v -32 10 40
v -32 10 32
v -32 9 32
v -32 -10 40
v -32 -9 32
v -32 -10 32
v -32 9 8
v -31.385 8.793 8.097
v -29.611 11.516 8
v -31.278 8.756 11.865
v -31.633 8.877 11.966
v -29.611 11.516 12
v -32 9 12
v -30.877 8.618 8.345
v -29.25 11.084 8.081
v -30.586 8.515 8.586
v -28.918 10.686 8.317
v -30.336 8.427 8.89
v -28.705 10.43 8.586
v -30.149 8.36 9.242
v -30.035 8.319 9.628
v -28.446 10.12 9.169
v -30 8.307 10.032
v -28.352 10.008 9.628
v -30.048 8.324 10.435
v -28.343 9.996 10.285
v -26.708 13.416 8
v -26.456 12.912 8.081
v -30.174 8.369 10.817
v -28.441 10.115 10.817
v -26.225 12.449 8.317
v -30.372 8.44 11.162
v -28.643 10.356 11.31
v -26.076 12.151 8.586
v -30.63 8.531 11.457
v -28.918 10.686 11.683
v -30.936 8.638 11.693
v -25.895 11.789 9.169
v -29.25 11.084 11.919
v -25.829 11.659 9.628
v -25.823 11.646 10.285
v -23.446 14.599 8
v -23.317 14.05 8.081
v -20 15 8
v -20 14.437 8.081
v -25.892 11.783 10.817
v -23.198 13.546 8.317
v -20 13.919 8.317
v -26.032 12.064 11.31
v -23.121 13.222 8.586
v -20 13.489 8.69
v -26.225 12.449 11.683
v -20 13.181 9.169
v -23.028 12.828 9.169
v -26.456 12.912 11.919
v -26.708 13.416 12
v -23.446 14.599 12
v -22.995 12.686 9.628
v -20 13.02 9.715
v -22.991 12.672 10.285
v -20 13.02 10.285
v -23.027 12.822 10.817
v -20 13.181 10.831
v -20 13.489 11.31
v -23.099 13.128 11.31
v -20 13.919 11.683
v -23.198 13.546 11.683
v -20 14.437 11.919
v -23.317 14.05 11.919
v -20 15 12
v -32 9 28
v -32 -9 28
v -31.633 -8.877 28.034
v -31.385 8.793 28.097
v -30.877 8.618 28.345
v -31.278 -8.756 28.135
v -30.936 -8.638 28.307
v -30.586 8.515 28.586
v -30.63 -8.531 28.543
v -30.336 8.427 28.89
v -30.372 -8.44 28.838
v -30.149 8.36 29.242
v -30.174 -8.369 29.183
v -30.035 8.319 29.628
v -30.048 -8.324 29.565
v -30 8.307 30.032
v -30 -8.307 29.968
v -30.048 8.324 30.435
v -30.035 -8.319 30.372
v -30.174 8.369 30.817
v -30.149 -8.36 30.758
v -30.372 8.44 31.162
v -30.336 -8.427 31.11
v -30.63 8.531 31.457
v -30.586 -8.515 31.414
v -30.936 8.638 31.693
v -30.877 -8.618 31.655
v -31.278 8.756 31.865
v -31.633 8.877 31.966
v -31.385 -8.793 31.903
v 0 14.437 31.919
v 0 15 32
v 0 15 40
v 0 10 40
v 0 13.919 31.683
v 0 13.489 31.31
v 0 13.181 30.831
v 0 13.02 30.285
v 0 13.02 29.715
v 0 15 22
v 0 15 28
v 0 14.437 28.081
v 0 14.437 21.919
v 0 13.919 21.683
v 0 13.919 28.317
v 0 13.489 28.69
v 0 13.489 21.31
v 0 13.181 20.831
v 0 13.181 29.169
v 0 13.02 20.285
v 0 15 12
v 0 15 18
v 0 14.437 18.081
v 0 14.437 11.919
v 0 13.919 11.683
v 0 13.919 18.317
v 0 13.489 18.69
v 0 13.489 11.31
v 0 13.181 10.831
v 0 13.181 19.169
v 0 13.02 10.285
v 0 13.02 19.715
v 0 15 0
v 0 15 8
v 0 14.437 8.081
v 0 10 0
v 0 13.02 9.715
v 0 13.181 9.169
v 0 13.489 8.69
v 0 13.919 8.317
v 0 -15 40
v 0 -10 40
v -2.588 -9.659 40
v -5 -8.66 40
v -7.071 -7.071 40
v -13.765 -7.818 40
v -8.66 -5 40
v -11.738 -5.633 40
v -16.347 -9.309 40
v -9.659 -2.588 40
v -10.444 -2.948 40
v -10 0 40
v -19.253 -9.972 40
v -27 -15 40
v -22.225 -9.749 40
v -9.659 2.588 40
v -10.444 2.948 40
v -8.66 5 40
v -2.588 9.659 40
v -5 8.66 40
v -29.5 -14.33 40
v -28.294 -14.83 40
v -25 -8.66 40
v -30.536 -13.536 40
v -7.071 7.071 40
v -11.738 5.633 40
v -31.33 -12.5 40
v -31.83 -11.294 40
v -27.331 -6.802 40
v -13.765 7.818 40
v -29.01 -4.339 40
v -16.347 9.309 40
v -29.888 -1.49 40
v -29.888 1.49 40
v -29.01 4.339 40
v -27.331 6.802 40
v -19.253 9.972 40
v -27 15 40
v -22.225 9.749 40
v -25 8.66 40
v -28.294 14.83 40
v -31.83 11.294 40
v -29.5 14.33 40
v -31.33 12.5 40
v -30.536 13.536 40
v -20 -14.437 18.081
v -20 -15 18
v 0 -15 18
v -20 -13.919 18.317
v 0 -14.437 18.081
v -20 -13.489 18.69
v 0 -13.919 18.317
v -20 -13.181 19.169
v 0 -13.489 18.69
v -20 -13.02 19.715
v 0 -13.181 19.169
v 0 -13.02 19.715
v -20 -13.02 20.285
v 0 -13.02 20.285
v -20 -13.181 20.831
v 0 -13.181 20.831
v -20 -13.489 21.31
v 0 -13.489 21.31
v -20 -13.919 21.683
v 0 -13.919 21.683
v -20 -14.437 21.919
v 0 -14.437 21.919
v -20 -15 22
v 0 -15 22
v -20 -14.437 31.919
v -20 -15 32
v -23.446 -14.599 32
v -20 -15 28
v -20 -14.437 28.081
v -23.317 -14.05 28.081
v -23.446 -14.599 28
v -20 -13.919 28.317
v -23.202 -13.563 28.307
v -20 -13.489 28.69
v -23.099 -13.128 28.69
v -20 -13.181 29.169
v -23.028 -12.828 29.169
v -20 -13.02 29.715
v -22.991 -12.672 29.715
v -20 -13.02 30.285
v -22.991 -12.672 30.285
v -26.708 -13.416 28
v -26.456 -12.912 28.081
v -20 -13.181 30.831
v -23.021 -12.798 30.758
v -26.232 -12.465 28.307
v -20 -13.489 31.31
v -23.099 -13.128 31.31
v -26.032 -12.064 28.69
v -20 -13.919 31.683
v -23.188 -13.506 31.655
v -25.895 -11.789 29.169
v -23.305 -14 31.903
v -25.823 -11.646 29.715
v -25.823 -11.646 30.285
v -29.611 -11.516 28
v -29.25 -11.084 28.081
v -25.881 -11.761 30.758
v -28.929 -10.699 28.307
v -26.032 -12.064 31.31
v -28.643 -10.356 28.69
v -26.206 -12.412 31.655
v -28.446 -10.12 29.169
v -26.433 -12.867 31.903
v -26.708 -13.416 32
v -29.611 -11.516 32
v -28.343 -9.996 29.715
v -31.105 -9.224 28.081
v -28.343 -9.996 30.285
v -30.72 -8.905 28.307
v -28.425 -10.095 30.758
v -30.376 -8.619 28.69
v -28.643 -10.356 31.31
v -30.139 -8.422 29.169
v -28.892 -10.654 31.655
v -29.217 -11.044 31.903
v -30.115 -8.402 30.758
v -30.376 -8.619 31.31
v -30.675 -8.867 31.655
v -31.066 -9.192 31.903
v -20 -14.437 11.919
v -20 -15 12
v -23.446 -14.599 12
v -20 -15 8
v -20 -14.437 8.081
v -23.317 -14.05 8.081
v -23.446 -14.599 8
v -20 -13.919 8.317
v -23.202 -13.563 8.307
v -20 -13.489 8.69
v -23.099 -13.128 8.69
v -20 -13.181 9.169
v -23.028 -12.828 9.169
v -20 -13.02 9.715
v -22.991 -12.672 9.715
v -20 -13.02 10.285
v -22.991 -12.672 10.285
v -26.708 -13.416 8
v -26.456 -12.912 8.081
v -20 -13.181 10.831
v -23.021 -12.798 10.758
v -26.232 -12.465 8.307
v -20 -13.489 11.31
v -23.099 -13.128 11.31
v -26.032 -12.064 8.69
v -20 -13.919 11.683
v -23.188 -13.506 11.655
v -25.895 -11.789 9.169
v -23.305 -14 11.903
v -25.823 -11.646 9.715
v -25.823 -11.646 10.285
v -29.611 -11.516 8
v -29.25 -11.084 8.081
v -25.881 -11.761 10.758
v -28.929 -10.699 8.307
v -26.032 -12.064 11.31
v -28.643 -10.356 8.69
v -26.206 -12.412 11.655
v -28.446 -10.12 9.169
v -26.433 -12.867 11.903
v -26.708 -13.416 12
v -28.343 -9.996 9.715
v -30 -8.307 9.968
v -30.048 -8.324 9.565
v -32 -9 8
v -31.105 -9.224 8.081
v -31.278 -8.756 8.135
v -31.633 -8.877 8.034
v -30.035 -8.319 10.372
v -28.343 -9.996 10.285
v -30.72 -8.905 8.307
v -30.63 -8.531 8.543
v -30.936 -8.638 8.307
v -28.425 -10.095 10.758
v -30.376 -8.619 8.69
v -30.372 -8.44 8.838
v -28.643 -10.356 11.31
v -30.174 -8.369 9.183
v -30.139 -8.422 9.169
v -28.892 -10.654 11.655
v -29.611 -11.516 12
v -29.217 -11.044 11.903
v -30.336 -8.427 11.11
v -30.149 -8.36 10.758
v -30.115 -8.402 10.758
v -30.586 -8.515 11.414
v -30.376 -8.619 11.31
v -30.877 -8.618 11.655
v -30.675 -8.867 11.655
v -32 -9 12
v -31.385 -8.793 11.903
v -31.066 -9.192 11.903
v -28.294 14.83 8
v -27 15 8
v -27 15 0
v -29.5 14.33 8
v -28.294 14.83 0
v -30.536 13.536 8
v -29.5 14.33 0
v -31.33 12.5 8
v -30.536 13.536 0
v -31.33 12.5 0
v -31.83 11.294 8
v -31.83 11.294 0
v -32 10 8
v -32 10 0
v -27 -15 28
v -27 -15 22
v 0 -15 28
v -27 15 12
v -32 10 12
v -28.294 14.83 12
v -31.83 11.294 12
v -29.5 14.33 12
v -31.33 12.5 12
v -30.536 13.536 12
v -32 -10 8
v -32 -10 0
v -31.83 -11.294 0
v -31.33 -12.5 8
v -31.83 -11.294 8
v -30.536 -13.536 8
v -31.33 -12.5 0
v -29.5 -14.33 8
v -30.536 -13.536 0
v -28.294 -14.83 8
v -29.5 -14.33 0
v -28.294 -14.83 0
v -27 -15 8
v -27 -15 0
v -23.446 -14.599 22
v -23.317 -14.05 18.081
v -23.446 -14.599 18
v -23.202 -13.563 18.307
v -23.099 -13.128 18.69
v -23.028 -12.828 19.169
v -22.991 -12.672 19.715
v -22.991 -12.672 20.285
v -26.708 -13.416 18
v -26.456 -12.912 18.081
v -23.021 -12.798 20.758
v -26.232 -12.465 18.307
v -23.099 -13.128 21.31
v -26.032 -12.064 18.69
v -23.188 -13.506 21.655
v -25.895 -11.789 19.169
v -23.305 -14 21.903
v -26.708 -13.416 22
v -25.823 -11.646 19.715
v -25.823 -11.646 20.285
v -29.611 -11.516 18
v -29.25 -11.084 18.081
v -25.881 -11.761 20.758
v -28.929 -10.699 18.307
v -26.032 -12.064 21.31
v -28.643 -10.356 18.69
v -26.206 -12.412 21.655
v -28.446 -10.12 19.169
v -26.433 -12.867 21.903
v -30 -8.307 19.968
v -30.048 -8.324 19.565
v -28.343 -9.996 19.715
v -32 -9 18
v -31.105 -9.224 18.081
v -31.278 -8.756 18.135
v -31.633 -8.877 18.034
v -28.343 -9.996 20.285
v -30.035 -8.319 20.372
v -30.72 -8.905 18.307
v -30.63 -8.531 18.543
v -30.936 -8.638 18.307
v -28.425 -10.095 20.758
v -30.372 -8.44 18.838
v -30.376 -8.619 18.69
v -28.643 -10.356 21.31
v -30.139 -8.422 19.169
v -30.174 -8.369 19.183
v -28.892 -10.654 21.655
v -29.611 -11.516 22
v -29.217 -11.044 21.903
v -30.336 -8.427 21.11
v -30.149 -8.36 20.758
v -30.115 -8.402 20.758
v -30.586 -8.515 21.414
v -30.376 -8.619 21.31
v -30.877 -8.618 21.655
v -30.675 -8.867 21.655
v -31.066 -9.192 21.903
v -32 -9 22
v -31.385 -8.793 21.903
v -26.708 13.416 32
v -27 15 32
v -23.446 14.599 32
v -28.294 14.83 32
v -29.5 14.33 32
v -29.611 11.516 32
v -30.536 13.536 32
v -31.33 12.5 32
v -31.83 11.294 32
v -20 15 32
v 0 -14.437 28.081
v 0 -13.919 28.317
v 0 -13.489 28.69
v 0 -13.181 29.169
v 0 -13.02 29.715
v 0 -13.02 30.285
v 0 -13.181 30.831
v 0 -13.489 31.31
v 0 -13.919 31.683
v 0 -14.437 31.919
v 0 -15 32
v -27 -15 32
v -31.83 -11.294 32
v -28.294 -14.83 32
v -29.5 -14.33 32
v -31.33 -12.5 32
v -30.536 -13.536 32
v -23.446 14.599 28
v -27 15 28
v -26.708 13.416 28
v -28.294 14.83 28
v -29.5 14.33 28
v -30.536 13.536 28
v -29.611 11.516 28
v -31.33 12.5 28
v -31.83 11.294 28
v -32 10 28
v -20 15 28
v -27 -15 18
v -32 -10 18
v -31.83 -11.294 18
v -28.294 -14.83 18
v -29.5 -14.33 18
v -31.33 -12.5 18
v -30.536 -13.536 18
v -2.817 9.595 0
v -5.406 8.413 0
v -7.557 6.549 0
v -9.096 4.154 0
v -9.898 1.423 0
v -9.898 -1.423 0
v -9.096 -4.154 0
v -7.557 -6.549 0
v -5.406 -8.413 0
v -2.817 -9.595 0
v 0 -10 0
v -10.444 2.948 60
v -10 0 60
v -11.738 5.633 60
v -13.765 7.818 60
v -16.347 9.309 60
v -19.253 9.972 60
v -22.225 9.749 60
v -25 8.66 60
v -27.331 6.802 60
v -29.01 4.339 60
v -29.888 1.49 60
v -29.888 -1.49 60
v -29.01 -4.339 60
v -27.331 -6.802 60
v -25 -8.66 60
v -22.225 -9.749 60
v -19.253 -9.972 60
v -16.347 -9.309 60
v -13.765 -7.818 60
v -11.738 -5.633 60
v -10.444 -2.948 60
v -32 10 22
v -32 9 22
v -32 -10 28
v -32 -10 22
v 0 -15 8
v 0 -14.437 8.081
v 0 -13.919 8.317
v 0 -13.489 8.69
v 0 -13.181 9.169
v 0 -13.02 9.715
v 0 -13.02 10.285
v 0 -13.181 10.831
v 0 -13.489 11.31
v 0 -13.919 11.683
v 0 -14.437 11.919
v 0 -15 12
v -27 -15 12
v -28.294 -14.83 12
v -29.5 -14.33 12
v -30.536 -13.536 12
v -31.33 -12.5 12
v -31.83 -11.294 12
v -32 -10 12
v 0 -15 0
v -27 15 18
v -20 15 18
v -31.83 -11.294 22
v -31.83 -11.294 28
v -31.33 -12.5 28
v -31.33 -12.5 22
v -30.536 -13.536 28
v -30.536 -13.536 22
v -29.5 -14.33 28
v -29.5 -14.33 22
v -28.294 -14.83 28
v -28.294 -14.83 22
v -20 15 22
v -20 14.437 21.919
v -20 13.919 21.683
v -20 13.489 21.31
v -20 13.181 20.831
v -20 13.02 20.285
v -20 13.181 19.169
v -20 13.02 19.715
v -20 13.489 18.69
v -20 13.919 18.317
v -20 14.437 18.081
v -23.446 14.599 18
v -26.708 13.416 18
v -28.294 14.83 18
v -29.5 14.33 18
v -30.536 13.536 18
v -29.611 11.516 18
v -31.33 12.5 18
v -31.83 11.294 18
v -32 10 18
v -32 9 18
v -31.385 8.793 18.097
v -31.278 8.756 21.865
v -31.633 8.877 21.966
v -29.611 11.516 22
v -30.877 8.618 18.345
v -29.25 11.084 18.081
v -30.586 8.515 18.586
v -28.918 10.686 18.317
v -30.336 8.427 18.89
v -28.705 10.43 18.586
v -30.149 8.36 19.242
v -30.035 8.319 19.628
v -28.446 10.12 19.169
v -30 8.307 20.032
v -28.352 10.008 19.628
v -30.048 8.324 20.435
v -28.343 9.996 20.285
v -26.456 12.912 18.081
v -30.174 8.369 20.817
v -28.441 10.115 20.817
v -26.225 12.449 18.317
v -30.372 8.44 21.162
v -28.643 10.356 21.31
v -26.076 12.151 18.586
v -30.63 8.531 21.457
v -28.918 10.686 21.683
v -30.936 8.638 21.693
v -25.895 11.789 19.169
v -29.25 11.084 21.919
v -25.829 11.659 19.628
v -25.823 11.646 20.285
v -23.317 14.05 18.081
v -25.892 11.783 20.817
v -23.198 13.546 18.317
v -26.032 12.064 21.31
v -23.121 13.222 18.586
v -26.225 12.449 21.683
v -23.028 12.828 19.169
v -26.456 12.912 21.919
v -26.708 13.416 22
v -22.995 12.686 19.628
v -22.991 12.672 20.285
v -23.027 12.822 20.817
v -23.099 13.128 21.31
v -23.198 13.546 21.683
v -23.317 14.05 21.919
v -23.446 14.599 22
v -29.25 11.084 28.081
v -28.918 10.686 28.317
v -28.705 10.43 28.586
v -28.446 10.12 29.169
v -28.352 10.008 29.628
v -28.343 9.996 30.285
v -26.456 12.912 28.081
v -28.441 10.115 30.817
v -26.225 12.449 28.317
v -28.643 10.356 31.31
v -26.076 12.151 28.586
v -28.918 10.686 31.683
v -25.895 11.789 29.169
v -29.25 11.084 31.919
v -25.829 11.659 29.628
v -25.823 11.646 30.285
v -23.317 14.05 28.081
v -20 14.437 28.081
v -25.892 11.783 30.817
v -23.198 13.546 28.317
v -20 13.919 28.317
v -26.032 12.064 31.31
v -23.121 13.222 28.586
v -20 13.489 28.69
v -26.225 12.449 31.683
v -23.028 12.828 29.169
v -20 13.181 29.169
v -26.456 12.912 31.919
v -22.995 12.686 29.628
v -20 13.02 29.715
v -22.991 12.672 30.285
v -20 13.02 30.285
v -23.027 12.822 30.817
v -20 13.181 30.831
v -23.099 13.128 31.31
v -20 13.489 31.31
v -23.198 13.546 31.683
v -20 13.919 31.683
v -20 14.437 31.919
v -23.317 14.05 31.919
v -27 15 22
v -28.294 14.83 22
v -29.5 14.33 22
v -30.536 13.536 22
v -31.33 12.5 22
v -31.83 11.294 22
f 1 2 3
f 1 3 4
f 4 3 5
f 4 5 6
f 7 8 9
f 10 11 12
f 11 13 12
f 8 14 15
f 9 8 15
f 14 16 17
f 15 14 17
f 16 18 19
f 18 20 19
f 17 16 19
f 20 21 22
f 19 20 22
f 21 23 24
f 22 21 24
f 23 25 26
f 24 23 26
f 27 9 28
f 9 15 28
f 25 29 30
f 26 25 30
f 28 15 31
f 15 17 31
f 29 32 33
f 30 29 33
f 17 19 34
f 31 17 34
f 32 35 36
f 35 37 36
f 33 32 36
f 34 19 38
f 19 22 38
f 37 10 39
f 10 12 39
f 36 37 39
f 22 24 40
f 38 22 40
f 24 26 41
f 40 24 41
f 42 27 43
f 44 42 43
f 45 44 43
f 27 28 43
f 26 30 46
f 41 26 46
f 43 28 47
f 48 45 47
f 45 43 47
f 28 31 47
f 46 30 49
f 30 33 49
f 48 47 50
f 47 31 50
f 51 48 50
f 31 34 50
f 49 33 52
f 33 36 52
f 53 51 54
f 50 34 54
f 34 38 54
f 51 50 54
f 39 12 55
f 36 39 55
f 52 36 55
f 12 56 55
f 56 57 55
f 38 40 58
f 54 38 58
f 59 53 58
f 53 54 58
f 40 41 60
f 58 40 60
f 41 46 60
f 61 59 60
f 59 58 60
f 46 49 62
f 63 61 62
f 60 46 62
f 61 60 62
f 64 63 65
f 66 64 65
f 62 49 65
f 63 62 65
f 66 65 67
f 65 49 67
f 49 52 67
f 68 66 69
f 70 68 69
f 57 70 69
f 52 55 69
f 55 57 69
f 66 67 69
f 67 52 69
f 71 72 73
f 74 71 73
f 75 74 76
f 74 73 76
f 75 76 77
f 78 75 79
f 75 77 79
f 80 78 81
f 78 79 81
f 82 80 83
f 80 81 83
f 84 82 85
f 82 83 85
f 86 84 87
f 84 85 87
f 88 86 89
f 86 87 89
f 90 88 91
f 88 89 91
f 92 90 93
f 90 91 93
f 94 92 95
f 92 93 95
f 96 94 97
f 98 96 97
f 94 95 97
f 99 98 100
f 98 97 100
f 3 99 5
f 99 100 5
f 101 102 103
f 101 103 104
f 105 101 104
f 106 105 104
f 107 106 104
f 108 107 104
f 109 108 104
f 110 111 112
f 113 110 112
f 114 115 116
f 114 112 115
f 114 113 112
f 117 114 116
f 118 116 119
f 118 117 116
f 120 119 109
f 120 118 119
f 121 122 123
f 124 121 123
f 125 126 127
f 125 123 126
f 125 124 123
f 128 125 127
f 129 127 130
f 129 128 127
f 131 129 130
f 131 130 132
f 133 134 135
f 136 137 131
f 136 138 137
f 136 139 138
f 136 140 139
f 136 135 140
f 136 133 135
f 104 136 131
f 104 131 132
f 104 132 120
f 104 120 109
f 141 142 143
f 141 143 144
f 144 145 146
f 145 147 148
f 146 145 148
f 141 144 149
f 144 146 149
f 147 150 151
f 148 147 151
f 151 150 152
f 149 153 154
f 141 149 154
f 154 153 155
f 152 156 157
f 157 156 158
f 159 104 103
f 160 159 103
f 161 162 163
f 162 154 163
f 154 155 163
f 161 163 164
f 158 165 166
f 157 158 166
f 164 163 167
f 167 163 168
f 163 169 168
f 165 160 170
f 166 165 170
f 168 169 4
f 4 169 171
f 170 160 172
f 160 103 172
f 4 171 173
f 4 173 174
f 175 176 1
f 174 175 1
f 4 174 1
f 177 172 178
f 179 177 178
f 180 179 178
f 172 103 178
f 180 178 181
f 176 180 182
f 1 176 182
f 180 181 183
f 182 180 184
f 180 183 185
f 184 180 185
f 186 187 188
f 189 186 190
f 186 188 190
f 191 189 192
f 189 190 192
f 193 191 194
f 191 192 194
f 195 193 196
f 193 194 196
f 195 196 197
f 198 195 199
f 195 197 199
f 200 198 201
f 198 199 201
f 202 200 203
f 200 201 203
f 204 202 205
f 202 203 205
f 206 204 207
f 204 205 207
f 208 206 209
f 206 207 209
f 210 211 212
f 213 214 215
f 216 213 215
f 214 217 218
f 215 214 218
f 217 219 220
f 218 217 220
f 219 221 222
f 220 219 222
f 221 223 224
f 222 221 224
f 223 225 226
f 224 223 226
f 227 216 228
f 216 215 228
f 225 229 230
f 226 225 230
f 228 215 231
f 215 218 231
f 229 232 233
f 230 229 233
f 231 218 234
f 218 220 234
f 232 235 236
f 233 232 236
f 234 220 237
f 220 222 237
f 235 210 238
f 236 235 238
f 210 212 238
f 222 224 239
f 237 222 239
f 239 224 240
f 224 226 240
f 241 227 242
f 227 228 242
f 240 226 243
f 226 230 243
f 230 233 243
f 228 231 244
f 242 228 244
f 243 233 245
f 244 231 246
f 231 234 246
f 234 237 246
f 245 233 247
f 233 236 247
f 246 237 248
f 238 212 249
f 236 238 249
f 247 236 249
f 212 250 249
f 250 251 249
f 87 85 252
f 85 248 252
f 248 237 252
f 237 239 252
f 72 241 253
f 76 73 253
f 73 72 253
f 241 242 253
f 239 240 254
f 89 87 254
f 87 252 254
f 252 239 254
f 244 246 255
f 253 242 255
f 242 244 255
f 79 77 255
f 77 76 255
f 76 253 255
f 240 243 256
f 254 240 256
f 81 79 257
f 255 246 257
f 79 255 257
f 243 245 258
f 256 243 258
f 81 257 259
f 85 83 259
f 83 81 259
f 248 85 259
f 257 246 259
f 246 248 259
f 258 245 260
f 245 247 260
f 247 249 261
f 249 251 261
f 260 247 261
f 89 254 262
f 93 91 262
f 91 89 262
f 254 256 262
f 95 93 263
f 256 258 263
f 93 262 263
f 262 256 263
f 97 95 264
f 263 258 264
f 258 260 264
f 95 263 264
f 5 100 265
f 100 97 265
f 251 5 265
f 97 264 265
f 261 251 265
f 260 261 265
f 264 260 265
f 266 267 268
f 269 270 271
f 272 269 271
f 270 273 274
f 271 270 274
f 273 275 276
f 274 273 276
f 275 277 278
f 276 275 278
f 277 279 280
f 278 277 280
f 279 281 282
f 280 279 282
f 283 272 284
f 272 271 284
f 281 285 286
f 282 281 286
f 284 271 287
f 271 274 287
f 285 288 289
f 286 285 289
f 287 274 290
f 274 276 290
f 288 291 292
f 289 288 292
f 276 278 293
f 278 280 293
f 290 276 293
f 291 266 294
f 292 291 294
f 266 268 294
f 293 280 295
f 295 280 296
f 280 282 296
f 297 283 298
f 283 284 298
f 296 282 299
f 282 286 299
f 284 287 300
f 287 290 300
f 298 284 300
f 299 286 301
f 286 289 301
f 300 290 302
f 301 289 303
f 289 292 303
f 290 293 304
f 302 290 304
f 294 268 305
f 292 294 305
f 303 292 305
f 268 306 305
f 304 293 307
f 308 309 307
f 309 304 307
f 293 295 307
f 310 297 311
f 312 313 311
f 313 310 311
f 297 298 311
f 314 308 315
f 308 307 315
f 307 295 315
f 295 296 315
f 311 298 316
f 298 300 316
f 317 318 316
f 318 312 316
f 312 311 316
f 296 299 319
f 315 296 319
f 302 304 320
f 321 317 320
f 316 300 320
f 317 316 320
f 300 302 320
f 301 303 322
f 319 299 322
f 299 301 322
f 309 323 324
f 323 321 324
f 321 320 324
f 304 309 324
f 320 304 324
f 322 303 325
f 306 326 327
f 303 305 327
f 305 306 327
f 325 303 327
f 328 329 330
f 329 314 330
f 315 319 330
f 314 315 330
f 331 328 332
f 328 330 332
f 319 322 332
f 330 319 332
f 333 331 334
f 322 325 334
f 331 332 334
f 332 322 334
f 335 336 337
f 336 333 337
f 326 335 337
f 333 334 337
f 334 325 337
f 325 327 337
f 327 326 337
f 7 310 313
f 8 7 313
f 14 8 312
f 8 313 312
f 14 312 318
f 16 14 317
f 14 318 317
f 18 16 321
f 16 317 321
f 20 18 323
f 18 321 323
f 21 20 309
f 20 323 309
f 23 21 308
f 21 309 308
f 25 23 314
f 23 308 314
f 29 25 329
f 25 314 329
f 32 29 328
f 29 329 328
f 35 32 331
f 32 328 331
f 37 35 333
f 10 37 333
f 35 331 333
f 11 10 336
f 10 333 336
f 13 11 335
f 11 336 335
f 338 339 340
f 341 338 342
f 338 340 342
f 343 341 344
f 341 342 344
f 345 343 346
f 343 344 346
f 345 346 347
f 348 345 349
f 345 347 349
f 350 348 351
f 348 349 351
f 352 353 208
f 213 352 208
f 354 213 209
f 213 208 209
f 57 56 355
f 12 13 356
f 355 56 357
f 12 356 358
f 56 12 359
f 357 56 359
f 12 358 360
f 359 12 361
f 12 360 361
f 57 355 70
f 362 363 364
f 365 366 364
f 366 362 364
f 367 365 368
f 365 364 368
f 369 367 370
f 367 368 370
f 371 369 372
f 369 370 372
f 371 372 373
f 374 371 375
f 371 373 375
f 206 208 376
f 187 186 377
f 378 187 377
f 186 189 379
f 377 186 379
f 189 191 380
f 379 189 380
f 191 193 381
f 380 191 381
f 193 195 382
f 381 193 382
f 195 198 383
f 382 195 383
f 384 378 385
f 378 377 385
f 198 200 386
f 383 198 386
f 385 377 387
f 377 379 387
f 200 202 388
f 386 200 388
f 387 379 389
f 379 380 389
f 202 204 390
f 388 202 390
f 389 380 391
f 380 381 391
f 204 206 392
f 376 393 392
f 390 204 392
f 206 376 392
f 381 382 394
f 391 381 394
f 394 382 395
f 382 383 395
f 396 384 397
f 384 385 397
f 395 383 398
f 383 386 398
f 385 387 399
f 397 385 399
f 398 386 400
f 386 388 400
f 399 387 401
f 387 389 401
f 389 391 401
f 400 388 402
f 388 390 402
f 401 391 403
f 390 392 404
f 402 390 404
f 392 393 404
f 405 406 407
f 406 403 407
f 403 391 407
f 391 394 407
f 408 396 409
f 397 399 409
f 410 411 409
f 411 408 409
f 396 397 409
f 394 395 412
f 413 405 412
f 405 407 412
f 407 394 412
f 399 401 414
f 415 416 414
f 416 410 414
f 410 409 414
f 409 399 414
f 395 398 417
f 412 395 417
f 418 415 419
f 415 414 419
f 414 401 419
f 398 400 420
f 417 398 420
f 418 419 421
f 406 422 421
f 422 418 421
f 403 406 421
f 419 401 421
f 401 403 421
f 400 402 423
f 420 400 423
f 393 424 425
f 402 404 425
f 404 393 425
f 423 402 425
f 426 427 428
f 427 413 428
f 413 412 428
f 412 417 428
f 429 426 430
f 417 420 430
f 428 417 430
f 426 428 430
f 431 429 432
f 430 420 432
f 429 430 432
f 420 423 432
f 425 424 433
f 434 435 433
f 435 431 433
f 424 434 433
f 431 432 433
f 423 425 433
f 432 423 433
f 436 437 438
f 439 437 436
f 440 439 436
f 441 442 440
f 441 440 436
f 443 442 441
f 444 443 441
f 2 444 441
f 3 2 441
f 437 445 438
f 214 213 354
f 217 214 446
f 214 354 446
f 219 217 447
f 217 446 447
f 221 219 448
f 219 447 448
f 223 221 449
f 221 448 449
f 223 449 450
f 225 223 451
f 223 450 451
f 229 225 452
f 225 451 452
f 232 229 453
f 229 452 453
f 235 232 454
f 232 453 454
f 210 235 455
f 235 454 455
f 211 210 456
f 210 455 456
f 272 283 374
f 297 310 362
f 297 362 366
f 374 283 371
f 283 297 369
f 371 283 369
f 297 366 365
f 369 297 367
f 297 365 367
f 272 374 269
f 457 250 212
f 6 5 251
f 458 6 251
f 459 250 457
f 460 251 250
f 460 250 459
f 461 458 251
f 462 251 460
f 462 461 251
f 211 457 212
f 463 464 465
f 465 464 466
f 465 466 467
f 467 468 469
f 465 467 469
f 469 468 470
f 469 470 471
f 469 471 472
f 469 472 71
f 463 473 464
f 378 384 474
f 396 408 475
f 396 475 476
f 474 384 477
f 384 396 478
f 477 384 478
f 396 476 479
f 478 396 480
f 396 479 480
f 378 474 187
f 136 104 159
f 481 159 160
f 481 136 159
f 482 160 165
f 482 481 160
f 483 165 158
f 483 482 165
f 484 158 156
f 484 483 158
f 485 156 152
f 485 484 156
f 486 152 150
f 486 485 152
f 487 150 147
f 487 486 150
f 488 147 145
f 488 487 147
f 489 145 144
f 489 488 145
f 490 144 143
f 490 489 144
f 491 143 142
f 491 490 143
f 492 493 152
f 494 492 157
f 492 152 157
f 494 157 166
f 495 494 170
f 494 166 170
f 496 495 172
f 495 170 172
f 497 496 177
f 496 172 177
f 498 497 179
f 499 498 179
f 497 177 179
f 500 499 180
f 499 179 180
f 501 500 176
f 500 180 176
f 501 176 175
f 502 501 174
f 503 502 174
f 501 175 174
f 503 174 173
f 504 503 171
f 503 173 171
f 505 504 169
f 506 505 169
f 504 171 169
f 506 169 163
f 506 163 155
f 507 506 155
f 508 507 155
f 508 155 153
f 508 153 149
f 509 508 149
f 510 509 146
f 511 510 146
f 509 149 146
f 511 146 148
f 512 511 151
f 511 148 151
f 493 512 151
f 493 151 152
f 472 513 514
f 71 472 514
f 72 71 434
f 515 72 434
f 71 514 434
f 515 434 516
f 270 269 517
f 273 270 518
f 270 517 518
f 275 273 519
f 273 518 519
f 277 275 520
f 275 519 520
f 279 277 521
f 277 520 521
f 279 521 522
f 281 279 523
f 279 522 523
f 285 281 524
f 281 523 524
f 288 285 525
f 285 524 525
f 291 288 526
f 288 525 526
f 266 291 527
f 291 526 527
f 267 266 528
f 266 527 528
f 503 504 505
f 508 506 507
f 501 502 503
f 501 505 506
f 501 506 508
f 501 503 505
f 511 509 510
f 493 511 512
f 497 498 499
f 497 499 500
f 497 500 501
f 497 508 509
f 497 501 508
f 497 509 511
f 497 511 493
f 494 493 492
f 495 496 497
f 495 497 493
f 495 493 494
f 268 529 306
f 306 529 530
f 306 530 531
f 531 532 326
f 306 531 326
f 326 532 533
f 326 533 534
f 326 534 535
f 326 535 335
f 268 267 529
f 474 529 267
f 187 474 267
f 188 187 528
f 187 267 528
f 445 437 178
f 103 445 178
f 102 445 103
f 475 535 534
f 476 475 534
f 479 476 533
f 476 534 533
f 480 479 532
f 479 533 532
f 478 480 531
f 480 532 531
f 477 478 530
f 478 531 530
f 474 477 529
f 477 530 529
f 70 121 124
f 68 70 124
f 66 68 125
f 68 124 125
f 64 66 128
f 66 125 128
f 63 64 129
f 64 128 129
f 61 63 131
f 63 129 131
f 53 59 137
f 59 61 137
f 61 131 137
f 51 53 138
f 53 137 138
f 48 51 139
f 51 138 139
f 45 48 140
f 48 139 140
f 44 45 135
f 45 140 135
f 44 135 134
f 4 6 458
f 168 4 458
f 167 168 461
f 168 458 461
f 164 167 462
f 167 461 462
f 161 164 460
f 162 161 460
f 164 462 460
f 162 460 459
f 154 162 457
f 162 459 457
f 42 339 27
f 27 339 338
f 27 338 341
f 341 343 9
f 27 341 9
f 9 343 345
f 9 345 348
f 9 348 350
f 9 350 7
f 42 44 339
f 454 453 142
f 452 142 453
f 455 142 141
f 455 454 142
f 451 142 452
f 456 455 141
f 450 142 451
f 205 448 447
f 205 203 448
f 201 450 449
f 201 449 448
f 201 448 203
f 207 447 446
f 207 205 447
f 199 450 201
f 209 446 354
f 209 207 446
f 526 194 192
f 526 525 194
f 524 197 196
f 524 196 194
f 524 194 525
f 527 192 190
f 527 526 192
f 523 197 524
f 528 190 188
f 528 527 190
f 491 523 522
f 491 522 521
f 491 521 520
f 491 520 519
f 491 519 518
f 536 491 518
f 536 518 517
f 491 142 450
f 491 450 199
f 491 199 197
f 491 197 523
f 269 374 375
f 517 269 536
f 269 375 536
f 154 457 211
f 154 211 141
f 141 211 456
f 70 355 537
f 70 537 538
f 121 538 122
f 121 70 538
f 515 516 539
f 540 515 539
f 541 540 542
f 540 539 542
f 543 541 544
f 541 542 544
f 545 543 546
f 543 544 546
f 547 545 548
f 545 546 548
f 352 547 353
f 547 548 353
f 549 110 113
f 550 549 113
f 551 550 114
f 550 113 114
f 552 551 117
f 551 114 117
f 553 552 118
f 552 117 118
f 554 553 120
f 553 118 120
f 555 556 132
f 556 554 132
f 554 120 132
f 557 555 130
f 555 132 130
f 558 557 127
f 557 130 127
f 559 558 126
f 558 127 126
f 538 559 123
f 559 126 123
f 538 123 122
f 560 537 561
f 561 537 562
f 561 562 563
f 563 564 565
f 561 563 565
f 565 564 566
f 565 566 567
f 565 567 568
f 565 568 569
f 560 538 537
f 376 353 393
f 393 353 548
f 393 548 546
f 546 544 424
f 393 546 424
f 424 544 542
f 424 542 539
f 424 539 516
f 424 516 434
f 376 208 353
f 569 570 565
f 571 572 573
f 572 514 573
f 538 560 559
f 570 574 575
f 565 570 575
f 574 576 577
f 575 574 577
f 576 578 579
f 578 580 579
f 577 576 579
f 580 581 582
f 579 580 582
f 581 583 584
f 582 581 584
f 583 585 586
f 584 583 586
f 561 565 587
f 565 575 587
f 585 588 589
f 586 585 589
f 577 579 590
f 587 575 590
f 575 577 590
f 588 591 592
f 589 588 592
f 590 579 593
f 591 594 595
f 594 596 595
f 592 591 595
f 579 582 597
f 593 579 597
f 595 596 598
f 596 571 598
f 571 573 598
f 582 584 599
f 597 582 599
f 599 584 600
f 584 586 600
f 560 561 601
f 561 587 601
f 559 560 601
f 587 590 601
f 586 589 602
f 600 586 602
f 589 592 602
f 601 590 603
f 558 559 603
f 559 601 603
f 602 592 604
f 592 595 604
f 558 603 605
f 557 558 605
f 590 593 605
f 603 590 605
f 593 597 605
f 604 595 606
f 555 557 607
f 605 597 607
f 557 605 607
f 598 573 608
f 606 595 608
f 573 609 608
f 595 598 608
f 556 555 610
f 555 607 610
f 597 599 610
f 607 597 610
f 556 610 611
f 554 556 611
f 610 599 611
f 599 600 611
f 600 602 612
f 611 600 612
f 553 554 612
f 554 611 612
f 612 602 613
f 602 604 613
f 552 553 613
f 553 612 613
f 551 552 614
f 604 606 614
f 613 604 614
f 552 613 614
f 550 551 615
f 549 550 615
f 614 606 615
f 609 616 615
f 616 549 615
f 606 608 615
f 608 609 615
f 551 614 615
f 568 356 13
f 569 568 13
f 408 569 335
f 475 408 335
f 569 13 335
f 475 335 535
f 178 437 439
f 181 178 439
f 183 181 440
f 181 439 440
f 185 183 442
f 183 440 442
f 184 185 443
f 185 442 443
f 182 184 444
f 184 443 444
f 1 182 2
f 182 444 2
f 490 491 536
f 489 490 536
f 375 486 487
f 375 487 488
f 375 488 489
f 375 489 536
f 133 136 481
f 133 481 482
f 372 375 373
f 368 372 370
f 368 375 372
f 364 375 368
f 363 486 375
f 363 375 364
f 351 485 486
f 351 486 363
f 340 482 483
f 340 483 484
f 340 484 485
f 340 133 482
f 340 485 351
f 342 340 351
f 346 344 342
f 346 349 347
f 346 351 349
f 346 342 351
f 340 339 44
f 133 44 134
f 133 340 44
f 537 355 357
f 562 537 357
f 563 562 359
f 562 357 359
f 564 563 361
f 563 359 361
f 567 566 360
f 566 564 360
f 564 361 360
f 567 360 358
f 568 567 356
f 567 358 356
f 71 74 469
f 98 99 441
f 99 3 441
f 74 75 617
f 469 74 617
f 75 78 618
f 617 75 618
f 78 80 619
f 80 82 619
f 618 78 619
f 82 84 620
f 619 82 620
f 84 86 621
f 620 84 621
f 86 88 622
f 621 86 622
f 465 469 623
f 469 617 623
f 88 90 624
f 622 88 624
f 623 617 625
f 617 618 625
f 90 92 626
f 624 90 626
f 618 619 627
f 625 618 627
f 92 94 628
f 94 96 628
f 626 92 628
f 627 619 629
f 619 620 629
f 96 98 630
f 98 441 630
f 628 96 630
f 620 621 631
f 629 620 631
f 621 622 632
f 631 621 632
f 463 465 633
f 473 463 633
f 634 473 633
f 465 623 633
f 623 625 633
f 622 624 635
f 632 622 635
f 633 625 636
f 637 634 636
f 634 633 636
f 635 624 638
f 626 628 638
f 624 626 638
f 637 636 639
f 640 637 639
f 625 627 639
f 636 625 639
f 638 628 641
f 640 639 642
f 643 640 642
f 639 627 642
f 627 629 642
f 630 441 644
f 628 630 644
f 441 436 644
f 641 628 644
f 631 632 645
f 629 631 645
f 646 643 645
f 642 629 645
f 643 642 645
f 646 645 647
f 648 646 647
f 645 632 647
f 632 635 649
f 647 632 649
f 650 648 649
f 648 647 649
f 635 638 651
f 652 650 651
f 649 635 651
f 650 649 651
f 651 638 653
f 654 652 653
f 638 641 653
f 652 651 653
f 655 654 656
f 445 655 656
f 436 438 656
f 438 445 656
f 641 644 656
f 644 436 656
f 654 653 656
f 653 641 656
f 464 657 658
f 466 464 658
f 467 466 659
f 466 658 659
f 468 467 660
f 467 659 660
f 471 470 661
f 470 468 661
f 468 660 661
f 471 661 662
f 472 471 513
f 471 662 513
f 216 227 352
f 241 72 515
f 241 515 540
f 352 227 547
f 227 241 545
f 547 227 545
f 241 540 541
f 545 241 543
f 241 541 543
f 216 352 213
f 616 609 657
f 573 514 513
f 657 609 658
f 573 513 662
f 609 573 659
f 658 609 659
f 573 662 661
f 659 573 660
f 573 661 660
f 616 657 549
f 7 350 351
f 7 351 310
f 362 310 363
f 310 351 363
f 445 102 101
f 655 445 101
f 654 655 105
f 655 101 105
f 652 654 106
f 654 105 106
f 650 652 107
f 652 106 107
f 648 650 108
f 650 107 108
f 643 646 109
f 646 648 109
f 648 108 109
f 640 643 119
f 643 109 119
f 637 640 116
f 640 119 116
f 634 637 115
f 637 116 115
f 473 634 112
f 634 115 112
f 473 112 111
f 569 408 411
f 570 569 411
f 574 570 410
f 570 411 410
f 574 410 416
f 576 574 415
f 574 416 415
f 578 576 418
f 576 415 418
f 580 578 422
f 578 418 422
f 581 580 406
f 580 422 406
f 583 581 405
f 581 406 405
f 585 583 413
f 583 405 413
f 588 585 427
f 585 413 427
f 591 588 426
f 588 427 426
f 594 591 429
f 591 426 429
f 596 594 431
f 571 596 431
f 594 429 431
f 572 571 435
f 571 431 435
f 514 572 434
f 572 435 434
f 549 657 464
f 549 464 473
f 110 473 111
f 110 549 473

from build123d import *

# Parameters (mm, degrees)
PAD_DEPTH            = 40
SKETCH001_R          = 10
PAD001_DEPTH         = 20
SKETCH002_R          = 2
POCKET_DEPTH         = 32.001
SKETCH003_R          = 2
POCKET001_DEPTH      = 15.001
POCKET001_DEPTH_BACK = -15.001
GROOVE_ANGLE         = -180


with BuildPart() as part:
    # Sketch → Pad (new body)
    with BuildSketch(Plane.XY):
        with BuildLine():
            ThreePointArc((0, 10), (-10, 0), (0, -10))
            Line((0, -10), (0, -15))
            Line((-27, -15), (0, -15))
            ThreePointArc((-32, -10), (-30.535534, -13.535534), (-27, -15))
            Line((-32, 10), (-32, -10))
            ThreePointArc((-27, 15), (-30.535534, 13.535534), (-32, 10))
            Line((-27, 15), (0, 15))
            Line((0, 15), (0, 10))
        make_face()
    extrude(amount=PAD_DEPTH)

    # Sketch001 → Pad001 (join)
    with BuildSketch(Plane.XY.offset(40)):
        with Locations((-20, 0)):
            Circle(SKETCH001_R)
    extrude(amount=PAD001_DEPTH)

    # Sketch002 → Pocket (cut, through all)
    with BuildSketch(Plane.YZ):
        with Locations((-15, 20)):
            Circle(SKETCH002_R)
        with Locations((15, 20)):
            Circle(SKETCH002_R)
        with Locations((-15, 30)):
            Circle(SKETCH002_R)
        with Locations((-15, 10)):
            Circle(SKETCH002_R)
        with Locations((15, 30)):
            Circle(SKETCH002_R)
        with Locations((15, 10)):
            Circle(SKETCH002_R)
    extrude(amount=-POCKET_DEPTH, mode=Mode.SUBTRACT)

    # Sketch003 → Pocket001 (cut, two sides)
    with BuildSketch(Plane.XZ) as pocket001_sk:
        with Locations((-32, 20)):
            Circle(SKETCH003_R)
        with Locations((-32, 30)):
            Circle(SKETCH003_R)
        with Locations((-32, 10)):
            Circle(SKETCH003_R)
    extrude(amount=-POCKET001_DEPTH, mode=Mode.SUBTRACT)
    extrude(pocket001_sk.sketch, amount=-POCKET001_DEPTH_BACK, mode=Mode.SUBTRACT)

    # Sketch004 → Groove (revolve, cut)
    with BuildSketch(Plane.YZ.offset(-20)):
        with BuildLine():
            ThreePointArc((-15, 8), (-13, 10), (-15, 12))
            Line((-15, 12), (-25, 12))
            Line((-25, 12), (-25, 8))
            Line((-25, 8), (-15, 8))
        make_face()
        with BuildLine():
            ThreePointArc((-15, 28), (-13, 30), (-15, 32))
            Line((-25, 32), (-15, 32))
            Line((-25, 32), (-25, 28))
            Line((-25, 28), (-15, 28))
        make_face()
        with BuildLine():
            ThreePointArc((-15, 18), (-13, 20), (-15, 22))
            Line((-15, 22), (-25, 22))
            Line((-25, 22), (-25, 18))
            Line((-25, 18), (-15, 18))
        make_face()
    revolve(axis=Axis((-20, 0, 0), (0, 0, 1)), revolution_arc=GROOVE_ANGLE, mode=Mode.SUBTRACT)


solid = part.part
